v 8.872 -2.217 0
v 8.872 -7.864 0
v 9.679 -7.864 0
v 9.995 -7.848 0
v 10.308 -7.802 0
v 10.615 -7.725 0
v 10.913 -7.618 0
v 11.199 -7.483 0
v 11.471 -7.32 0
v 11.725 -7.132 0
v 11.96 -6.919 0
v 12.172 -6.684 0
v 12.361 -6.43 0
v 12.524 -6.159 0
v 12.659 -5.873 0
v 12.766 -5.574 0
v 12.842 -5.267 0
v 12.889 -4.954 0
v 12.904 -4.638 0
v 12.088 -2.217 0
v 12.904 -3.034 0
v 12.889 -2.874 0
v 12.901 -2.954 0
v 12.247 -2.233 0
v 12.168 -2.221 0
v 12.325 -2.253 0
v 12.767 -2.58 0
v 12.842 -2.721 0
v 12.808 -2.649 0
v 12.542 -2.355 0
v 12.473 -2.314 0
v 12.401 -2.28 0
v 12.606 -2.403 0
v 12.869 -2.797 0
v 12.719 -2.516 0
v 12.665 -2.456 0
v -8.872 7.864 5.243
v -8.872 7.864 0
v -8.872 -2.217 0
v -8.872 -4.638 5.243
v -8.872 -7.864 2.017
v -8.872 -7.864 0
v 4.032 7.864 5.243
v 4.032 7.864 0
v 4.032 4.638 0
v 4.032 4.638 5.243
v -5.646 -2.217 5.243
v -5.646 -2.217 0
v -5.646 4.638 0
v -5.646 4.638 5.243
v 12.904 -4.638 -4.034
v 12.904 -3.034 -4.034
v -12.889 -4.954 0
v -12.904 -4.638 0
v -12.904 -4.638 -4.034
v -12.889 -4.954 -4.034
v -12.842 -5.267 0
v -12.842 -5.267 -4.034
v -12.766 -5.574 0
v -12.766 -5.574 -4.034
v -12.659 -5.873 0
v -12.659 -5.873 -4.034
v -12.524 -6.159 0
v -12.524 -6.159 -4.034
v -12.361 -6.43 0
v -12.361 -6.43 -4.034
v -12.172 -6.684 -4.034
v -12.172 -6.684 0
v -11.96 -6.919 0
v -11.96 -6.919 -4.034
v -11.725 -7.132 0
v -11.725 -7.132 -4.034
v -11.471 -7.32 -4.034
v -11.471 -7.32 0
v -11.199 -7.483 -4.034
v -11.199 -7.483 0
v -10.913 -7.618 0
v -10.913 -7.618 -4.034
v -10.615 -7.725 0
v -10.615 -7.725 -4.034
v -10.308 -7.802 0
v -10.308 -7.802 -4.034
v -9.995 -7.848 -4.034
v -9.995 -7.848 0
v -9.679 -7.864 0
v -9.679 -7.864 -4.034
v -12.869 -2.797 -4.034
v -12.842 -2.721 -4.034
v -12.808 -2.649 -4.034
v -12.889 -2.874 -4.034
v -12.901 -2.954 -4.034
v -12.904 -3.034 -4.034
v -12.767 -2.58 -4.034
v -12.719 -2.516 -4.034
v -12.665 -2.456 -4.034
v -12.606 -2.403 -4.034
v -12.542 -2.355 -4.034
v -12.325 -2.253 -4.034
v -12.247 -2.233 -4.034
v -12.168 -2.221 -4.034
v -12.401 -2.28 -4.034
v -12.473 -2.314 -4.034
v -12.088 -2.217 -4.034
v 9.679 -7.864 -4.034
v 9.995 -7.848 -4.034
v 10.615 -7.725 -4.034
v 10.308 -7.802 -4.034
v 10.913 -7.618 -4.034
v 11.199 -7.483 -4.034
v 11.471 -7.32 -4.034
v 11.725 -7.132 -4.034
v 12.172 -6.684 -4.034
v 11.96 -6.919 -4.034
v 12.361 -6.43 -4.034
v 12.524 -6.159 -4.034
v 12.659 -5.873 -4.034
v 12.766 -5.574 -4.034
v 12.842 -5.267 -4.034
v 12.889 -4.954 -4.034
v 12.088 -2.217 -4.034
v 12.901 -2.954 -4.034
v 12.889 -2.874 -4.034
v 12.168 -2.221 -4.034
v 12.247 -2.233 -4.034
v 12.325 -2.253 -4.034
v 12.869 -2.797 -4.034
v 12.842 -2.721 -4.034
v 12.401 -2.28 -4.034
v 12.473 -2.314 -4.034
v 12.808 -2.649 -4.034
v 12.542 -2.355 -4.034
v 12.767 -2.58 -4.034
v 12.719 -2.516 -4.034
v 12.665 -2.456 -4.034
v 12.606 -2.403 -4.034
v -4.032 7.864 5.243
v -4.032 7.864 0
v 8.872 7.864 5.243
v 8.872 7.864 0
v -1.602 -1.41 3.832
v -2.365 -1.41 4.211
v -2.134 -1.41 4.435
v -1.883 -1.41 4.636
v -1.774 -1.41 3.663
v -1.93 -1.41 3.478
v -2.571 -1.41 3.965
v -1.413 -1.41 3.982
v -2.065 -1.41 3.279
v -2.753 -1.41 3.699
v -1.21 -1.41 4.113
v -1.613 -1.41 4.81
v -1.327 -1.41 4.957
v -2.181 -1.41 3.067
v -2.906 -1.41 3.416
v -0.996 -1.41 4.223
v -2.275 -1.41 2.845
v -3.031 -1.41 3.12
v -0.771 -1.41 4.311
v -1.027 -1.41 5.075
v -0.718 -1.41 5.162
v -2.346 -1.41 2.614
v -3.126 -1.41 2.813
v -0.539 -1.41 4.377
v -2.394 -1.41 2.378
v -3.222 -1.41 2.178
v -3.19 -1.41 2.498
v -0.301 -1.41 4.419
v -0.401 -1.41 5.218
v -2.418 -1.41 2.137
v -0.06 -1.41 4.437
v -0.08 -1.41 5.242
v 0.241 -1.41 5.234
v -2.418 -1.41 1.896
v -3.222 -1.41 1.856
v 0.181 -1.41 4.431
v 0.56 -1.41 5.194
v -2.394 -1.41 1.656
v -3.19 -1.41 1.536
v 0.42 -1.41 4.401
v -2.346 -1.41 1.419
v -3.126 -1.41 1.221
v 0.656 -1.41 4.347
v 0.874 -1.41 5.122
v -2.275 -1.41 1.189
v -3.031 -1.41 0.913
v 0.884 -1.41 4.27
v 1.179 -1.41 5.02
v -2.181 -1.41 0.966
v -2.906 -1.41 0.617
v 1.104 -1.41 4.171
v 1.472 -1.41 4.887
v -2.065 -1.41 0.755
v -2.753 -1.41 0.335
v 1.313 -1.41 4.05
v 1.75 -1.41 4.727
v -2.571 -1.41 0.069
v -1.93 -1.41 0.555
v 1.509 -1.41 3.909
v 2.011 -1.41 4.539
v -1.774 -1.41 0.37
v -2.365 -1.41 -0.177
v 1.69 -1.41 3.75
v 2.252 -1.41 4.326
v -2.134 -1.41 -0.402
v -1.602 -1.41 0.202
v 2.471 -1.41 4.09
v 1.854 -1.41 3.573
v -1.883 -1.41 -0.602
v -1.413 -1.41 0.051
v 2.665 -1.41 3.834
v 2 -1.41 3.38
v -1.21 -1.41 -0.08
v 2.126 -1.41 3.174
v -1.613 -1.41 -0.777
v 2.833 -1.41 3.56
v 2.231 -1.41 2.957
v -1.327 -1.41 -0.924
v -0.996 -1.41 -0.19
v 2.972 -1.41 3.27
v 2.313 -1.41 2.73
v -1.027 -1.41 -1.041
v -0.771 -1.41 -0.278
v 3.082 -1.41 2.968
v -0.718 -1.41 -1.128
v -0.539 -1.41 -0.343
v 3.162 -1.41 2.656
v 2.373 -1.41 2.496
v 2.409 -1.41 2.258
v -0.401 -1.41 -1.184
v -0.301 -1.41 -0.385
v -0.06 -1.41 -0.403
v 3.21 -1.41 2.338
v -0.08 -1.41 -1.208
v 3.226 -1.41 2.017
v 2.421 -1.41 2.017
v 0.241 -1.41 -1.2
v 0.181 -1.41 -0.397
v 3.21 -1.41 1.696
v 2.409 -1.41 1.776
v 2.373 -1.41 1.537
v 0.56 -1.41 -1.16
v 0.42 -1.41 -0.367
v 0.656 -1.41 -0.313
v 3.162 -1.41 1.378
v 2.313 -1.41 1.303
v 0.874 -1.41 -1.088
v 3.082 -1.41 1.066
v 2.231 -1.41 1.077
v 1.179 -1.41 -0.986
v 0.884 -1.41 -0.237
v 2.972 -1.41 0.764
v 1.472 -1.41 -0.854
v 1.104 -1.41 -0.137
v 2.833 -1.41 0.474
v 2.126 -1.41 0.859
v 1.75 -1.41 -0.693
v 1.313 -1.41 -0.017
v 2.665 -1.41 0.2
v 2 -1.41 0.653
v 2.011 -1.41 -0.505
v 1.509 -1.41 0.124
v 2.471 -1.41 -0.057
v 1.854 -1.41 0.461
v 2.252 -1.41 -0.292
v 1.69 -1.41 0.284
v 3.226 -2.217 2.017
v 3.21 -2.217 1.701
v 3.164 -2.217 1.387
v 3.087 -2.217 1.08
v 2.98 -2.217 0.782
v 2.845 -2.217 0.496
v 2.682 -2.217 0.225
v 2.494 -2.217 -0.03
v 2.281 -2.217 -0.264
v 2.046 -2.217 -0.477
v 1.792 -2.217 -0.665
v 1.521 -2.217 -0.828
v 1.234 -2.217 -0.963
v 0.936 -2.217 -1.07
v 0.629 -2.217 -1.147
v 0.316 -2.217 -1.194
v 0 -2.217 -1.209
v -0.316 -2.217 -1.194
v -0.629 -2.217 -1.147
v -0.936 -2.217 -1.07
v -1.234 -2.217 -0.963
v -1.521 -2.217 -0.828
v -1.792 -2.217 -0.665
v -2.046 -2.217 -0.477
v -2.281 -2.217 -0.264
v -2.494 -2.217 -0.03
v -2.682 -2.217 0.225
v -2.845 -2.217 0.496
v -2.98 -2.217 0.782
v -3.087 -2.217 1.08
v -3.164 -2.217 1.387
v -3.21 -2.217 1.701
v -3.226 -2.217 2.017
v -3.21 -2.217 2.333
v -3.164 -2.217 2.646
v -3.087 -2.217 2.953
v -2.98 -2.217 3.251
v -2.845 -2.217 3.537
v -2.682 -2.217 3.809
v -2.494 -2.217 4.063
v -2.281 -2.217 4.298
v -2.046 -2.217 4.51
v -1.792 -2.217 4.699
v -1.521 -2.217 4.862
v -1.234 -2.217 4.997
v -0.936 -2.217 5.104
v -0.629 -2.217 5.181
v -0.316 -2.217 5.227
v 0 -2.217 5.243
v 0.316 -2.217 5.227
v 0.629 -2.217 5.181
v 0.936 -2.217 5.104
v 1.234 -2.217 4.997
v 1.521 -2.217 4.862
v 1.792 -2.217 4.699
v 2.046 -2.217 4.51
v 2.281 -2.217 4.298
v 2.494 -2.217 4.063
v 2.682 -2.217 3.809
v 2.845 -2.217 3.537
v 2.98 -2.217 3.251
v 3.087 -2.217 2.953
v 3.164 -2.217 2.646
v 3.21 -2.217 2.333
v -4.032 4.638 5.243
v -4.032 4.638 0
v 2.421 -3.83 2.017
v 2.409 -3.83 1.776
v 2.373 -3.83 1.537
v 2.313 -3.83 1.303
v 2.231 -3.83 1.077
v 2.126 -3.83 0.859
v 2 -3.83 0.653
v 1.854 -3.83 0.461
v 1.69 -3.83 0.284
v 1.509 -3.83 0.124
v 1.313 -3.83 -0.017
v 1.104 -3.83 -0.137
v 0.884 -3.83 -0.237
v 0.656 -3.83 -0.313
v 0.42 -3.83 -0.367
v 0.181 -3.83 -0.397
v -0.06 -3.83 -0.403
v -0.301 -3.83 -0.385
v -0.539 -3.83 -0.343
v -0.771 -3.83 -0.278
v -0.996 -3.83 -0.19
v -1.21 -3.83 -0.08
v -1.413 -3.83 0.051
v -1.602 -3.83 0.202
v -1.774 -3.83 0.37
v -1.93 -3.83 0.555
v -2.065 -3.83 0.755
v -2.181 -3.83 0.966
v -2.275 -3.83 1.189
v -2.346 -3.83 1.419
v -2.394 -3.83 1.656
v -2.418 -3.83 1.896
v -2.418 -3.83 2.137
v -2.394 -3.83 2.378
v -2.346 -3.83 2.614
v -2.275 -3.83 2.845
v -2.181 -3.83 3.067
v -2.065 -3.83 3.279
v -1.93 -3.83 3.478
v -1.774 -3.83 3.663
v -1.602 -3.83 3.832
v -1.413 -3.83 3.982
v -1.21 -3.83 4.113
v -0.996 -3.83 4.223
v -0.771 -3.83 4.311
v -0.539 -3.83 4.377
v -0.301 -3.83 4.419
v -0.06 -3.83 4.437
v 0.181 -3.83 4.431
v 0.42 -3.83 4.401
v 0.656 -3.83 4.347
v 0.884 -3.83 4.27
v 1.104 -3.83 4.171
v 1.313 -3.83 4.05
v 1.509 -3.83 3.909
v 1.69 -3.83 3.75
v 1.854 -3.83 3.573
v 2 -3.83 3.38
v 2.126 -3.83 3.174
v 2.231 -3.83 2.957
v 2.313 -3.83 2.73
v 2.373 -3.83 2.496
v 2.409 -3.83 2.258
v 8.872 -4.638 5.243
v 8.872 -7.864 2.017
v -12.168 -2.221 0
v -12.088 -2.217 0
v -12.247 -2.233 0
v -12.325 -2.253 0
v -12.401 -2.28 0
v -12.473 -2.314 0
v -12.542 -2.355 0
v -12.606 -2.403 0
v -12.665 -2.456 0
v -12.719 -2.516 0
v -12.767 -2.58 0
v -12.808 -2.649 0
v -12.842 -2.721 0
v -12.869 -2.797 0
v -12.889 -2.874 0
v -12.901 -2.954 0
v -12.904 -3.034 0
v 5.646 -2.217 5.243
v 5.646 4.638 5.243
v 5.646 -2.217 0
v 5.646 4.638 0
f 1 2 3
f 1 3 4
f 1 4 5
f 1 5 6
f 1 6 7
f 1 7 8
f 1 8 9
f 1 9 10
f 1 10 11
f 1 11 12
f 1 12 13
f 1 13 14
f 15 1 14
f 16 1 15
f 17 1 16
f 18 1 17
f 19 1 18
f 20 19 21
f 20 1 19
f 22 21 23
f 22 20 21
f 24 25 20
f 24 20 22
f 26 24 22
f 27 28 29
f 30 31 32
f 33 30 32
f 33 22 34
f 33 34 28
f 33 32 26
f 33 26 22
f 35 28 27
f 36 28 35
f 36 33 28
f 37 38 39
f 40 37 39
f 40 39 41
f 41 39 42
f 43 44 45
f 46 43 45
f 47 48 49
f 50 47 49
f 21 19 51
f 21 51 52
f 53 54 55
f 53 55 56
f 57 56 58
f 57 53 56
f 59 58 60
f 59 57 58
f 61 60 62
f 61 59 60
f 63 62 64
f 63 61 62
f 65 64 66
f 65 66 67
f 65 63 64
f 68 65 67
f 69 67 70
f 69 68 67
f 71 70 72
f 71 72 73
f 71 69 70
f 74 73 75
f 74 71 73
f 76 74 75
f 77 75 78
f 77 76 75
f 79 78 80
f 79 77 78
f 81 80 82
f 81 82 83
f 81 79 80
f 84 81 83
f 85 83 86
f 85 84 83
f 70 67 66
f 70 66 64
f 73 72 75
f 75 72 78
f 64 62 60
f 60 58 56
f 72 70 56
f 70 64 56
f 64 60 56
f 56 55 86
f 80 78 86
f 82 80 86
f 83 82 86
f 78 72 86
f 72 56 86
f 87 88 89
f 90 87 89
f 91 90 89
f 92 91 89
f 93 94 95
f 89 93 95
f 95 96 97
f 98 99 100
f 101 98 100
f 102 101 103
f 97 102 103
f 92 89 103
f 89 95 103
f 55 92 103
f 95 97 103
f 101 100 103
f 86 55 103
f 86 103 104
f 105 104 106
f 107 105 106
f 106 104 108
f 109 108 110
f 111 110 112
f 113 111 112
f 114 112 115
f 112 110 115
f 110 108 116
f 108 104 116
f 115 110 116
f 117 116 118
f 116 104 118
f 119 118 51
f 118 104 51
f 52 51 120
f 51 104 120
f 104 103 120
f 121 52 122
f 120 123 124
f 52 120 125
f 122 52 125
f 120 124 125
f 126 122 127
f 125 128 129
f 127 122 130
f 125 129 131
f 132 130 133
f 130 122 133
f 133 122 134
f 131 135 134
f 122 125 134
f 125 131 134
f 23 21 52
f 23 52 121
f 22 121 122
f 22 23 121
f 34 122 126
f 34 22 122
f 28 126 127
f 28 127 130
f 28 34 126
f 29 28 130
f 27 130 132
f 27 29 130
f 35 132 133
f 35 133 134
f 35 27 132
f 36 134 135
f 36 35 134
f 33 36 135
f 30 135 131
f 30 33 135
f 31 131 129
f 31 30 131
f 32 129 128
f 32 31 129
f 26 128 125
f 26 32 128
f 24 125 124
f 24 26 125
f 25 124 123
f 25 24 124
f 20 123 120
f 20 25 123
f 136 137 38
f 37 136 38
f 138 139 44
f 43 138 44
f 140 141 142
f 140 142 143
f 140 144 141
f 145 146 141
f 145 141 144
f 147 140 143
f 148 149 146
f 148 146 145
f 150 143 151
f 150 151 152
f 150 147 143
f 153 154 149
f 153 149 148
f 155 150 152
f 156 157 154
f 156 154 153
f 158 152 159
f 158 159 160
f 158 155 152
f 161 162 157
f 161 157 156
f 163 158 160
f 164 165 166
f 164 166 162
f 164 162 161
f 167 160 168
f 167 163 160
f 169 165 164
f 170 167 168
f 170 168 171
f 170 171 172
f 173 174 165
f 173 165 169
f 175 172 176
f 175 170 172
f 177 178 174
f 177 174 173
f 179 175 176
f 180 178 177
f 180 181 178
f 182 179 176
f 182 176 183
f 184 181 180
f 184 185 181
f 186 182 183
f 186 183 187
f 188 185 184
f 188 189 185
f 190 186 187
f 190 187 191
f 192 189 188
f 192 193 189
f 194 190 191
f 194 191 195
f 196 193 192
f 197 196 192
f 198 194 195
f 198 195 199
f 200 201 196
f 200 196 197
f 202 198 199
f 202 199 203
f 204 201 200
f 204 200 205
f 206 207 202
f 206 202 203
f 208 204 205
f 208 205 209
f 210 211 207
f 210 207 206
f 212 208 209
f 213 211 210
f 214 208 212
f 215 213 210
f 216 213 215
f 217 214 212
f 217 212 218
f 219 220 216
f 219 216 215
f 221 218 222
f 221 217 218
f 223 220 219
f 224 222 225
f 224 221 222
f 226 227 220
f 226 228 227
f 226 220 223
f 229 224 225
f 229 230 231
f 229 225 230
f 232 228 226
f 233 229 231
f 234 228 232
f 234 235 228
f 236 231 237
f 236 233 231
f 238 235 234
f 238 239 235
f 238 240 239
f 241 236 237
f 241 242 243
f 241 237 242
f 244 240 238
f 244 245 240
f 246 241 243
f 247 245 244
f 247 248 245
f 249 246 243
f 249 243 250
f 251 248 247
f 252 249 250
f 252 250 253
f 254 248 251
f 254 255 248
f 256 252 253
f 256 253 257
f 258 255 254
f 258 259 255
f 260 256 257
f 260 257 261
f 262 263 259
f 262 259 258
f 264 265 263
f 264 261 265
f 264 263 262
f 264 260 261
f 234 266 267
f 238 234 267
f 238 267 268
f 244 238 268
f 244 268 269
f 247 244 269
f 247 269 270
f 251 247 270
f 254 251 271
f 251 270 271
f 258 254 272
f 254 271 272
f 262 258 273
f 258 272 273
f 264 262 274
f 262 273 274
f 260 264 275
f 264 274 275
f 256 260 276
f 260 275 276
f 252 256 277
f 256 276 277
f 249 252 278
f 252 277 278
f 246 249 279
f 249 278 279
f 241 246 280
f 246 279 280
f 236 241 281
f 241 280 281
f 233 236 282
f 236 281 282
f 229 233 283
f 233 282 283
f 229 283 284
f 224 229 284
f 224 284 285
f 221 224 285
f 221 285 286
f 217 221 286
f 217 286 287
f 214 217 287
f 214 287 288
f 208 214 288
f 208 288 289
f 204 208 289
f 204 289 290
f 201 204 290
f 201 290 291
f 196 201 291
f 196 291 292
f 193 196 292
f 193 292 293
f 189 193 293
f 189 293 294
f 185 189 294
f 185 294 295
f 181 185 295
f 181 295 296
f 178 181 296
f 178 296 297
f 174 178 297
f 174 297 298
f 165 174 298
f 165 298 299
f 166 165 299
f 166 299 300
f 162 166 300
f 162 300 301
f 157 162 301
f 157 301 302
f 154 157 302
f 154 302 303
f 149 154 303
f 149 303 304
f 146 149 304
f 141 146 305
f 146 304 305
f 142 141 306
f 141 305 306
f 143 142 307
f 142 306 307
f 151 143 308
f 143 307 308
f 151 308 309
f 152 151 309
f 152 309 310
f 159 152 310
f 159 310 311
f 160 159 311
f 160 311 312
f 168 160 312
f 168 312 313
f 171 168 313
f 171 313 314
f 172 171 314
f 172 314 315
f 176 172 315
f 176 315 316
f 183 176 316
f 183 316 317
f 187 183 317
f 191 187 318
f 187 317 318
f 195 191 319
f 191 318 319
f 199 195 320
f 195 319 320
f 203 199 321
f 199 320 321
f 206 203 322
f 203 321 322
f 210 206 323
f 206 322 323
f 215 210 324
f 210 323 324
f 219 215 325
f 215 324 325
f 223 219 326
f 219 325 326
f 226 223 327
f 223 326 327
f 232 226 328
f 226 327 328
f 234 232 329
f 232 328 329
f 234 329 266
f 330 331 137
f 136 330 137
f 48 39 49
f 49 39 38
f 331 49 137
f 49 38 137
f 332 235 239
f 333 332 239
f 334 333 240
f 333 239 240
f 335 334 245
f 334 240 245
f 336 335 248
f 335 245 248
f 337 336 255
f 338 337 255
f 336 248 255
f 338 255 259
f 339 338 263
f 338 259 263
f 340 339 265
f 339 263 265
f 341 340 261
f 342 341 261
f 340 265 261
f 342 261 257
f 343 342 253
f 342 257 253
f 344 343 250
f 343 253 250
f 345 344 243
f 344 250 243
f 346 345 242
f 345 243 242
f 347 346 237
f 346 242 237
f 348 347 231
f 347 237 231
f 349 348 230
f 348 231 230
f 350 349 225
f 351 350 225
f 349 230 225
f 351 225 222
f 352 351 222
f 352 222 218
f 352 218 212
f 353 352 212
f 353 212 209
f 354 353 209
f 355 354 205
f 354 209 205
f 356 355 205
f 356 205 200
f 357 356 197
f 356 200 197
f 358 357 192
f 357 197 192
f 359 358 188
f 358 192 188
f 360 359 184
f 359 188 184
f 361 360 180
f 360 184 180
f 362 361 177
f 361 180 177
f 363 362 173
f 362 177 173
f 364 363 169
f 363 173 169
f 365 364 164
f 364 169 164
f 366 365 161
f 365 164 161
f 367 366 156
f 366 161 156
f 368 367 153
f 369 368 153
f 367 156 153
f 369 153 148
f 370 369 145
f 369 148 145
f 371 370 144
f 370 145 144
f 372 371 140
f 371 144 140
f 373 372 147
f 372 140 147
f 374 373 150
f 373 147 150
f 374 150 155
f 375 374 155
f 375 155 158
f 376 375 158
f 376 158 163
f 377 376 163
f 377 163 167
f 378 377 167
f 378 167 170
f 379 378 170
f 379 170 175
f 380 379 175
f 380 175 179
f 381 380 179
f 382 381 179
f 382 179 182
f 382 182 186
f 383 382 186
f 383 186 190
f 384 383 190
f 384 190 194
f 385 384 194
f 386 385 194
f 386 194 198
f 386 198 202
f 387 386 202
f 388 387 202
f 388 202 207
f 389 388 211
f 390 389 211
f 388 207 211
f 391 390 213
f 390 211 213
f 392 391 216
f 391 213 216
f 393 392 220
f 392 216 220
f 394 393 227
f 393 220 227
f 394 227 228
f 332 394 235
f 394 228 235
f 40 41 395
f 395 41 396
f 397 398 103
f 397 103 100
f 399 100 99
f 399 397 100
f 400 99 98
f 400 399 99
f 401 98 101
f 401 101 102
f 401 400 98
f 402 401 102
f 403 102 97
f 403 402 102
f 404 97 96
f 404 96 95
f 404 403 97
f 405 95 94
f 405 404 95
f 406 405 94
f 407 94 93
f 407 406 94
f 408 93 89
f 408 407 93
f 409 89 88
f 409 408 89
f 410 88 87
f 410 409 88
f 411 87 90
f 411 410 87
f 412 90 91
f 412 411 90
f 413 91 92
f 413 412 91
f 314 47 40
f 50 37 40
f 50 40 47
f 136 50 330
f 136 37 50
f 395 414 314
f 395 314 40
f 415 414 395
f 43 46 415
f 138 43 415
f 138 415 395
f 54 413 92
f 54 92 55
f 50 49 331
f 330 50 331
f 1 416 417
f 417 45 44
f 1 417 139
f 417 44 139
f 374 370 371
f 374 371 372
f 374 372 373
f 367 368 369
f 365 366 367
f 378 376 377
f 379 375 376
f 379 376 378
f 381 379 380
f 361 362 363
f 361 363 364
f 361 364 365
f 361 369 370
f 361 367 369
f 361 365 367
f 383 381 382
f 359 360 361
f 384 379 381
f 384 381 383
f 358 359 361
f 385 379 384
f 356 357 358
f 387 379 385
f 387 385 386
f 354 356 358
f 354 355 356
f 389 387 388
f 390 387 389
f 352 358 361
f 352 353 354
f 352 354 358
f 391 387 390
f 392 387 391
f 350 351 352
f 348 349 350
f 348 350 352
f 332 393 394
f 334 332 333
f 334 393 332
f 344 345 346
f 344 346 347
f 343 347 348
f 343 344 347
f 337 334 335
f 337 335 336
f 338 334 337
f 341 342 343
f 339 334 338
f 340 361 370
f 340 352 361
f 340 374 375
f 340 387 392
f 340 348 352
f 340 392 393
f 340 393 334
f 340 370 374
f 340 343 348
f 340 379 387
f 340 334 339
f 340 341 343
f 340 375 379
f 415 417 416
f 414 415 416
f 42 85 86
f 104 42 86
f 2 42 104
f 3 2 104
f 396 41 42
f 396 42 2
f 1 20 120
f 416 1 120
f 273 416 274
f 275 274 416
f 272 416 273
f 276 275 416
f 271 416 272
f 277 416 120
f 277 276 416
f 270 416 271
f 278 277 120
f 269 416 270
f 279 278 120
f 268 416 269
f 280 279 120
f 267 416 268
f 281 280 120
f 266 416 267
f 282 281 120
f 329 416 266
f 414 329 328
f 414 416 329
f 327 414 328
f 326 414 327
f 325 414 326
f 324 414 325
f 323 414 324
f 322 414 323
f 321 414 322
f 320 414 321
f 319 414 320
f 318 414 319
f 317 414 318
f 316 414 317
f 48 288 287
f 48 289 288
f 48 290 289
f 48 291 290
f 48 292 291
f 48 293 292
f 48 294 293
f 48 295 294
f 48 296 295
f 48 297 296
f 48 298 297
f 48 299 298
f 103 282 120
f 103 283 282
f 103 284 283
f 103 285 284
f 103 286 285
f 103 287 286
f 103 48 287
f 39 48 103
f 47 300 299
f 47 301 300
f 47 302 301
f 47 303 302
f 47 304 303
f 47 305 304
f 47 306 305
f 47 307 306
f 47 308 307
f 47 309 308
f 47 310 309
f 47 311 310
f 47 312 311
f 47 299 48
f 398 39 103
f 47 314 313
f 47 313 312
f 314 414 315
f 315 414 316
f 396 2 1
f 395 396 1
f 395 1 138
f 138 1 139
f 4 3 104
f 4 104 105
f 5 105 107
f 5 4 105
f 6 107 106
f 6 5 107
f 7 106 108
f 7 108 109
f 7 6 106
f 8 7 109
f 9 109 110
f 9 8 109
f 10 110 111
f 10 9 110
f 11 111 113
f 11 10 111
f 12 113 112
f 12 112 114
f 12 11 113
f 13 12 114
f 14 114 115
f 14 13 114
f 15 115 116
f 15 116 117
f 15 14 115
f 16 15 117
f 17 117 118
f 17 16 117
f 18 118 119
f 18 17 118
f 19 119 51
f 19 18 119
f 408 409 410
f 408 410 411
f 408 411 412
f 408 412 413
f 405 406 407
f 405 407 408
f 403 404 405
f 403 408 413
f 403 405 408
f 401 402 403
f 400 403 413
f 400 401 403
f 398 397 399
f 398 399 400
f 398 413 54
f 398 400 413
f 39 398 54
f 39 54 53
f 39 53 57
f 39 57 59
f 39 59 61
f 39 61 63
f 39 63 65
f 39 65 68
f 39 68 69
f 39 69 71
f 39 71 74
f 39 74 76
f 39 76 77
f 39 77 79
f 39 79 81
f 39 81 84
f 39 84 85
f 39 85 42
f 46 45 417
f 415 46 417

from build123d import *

# Parameters (mm, degrees)
BOSS_EXTRUDE1_DEPTH = 5.24256
BOSS_EXTRUDE2_DEPTH = 4.03352
CHAMFER1_SIZE       = 3.2258
SKETCH3_R           = 3.2258
BOSS_EXTRUDE3_DEPTH = 0.80772
SKETCH4_R           = 2.42062
CUT_EXTRUDE1_DEPTH  = 2.42062


with BuildPart() as part:
    # Sketch1 → Boss-Extrude1 (new body)
    with BuildSketch(Plane.XY):
        Polygon((-8.87222, -7.86384), (8.87222, -7.86384), (8.87222, 7.86384), (4.03225, 7.86384), (4.03225, 4.63804), (5.64642, 4.63804), (5.64642, -2.21742), (-5.64642, -2.21742), (-5.64642, 4.63804), (-4.03225, 4.63804), (-4.03225, 7.86384), (-8.87222, 7.86384), align=None)
    extrude(amount=BOSS_EXTRUDE1_DEPTH)

    # Sketch2 → Boss-Extrude2 (add)
    with BuildSketch(Plane(origin=(0, 0, 0), x_dir=(-1, 0, 0), z_dir=(0, 0, -1))):
        with BuildLine():
            Line((-12.088220572, -2.21742), (12.088220572, -2.21742))
            ThreePointArc((12.088220572, -2.21742), (12.665396078, -2.456493922), (12.90447, -3.033669428))
            Line((12.90447, -3.033669428), (12.90447, -4.63804))
            ThreePointArc((12.90447, -4.63804), (11.959655055, -6.919025055), (9.67867, -7.86384))
            Line((9.67867, -7.86384), (-9.67867, -7.86384))
            ThreePointArc((-9.67867, -7.86384), (-11.959655055, -6.919025055), (-12.90447, -4.63804))
            Line((-12.90447, -4.63804), (-12.90447, -3.033669428))
            ThreePointArc((-12.90447, -3.033669428), (-12.665396078, -2.456493922), (-12.088220572, -2.21742))
        make_face()
    extrude(amount=BOSS_EXTRUDE2_DEPTH)

    # Chamfer1
    chamfer1_edges = [part.edges().sort_by_distance(p)[0] for p in [
        (0, -7.86384, 5.24256),
    ]]
    chamfer(chamfer1_edges, length=CHAMFER1_SIZE)

    # Sketch3 → Boss-Extrude3 (add)
    with BuildSketch(Plane(origin=(0, -2.21742, 0), x_dir=(1, 0, 0), z_dir=(0, 1, 0))):
        with Locations((0, -2.01676)):
            Circle(SKETCH3_R)
    extrude(amount=BOSS_EXTRUDE3_DEPTH)

    # Sketch4 → Cut-Extrude1 (cut)
    with BuildSketch(Plane(origin=(0, -1.4097, 0), x_dir=(1, 0, 0), z_dir=(0, 1, 0))):
        with Locations((0, -2.01676)):
            Circle(SKETCH4_R)
    extrude(amount=-CUT_EXTRUDE1_DEPTH, mode=Mode.SUBTRACT)


solid = part.part
